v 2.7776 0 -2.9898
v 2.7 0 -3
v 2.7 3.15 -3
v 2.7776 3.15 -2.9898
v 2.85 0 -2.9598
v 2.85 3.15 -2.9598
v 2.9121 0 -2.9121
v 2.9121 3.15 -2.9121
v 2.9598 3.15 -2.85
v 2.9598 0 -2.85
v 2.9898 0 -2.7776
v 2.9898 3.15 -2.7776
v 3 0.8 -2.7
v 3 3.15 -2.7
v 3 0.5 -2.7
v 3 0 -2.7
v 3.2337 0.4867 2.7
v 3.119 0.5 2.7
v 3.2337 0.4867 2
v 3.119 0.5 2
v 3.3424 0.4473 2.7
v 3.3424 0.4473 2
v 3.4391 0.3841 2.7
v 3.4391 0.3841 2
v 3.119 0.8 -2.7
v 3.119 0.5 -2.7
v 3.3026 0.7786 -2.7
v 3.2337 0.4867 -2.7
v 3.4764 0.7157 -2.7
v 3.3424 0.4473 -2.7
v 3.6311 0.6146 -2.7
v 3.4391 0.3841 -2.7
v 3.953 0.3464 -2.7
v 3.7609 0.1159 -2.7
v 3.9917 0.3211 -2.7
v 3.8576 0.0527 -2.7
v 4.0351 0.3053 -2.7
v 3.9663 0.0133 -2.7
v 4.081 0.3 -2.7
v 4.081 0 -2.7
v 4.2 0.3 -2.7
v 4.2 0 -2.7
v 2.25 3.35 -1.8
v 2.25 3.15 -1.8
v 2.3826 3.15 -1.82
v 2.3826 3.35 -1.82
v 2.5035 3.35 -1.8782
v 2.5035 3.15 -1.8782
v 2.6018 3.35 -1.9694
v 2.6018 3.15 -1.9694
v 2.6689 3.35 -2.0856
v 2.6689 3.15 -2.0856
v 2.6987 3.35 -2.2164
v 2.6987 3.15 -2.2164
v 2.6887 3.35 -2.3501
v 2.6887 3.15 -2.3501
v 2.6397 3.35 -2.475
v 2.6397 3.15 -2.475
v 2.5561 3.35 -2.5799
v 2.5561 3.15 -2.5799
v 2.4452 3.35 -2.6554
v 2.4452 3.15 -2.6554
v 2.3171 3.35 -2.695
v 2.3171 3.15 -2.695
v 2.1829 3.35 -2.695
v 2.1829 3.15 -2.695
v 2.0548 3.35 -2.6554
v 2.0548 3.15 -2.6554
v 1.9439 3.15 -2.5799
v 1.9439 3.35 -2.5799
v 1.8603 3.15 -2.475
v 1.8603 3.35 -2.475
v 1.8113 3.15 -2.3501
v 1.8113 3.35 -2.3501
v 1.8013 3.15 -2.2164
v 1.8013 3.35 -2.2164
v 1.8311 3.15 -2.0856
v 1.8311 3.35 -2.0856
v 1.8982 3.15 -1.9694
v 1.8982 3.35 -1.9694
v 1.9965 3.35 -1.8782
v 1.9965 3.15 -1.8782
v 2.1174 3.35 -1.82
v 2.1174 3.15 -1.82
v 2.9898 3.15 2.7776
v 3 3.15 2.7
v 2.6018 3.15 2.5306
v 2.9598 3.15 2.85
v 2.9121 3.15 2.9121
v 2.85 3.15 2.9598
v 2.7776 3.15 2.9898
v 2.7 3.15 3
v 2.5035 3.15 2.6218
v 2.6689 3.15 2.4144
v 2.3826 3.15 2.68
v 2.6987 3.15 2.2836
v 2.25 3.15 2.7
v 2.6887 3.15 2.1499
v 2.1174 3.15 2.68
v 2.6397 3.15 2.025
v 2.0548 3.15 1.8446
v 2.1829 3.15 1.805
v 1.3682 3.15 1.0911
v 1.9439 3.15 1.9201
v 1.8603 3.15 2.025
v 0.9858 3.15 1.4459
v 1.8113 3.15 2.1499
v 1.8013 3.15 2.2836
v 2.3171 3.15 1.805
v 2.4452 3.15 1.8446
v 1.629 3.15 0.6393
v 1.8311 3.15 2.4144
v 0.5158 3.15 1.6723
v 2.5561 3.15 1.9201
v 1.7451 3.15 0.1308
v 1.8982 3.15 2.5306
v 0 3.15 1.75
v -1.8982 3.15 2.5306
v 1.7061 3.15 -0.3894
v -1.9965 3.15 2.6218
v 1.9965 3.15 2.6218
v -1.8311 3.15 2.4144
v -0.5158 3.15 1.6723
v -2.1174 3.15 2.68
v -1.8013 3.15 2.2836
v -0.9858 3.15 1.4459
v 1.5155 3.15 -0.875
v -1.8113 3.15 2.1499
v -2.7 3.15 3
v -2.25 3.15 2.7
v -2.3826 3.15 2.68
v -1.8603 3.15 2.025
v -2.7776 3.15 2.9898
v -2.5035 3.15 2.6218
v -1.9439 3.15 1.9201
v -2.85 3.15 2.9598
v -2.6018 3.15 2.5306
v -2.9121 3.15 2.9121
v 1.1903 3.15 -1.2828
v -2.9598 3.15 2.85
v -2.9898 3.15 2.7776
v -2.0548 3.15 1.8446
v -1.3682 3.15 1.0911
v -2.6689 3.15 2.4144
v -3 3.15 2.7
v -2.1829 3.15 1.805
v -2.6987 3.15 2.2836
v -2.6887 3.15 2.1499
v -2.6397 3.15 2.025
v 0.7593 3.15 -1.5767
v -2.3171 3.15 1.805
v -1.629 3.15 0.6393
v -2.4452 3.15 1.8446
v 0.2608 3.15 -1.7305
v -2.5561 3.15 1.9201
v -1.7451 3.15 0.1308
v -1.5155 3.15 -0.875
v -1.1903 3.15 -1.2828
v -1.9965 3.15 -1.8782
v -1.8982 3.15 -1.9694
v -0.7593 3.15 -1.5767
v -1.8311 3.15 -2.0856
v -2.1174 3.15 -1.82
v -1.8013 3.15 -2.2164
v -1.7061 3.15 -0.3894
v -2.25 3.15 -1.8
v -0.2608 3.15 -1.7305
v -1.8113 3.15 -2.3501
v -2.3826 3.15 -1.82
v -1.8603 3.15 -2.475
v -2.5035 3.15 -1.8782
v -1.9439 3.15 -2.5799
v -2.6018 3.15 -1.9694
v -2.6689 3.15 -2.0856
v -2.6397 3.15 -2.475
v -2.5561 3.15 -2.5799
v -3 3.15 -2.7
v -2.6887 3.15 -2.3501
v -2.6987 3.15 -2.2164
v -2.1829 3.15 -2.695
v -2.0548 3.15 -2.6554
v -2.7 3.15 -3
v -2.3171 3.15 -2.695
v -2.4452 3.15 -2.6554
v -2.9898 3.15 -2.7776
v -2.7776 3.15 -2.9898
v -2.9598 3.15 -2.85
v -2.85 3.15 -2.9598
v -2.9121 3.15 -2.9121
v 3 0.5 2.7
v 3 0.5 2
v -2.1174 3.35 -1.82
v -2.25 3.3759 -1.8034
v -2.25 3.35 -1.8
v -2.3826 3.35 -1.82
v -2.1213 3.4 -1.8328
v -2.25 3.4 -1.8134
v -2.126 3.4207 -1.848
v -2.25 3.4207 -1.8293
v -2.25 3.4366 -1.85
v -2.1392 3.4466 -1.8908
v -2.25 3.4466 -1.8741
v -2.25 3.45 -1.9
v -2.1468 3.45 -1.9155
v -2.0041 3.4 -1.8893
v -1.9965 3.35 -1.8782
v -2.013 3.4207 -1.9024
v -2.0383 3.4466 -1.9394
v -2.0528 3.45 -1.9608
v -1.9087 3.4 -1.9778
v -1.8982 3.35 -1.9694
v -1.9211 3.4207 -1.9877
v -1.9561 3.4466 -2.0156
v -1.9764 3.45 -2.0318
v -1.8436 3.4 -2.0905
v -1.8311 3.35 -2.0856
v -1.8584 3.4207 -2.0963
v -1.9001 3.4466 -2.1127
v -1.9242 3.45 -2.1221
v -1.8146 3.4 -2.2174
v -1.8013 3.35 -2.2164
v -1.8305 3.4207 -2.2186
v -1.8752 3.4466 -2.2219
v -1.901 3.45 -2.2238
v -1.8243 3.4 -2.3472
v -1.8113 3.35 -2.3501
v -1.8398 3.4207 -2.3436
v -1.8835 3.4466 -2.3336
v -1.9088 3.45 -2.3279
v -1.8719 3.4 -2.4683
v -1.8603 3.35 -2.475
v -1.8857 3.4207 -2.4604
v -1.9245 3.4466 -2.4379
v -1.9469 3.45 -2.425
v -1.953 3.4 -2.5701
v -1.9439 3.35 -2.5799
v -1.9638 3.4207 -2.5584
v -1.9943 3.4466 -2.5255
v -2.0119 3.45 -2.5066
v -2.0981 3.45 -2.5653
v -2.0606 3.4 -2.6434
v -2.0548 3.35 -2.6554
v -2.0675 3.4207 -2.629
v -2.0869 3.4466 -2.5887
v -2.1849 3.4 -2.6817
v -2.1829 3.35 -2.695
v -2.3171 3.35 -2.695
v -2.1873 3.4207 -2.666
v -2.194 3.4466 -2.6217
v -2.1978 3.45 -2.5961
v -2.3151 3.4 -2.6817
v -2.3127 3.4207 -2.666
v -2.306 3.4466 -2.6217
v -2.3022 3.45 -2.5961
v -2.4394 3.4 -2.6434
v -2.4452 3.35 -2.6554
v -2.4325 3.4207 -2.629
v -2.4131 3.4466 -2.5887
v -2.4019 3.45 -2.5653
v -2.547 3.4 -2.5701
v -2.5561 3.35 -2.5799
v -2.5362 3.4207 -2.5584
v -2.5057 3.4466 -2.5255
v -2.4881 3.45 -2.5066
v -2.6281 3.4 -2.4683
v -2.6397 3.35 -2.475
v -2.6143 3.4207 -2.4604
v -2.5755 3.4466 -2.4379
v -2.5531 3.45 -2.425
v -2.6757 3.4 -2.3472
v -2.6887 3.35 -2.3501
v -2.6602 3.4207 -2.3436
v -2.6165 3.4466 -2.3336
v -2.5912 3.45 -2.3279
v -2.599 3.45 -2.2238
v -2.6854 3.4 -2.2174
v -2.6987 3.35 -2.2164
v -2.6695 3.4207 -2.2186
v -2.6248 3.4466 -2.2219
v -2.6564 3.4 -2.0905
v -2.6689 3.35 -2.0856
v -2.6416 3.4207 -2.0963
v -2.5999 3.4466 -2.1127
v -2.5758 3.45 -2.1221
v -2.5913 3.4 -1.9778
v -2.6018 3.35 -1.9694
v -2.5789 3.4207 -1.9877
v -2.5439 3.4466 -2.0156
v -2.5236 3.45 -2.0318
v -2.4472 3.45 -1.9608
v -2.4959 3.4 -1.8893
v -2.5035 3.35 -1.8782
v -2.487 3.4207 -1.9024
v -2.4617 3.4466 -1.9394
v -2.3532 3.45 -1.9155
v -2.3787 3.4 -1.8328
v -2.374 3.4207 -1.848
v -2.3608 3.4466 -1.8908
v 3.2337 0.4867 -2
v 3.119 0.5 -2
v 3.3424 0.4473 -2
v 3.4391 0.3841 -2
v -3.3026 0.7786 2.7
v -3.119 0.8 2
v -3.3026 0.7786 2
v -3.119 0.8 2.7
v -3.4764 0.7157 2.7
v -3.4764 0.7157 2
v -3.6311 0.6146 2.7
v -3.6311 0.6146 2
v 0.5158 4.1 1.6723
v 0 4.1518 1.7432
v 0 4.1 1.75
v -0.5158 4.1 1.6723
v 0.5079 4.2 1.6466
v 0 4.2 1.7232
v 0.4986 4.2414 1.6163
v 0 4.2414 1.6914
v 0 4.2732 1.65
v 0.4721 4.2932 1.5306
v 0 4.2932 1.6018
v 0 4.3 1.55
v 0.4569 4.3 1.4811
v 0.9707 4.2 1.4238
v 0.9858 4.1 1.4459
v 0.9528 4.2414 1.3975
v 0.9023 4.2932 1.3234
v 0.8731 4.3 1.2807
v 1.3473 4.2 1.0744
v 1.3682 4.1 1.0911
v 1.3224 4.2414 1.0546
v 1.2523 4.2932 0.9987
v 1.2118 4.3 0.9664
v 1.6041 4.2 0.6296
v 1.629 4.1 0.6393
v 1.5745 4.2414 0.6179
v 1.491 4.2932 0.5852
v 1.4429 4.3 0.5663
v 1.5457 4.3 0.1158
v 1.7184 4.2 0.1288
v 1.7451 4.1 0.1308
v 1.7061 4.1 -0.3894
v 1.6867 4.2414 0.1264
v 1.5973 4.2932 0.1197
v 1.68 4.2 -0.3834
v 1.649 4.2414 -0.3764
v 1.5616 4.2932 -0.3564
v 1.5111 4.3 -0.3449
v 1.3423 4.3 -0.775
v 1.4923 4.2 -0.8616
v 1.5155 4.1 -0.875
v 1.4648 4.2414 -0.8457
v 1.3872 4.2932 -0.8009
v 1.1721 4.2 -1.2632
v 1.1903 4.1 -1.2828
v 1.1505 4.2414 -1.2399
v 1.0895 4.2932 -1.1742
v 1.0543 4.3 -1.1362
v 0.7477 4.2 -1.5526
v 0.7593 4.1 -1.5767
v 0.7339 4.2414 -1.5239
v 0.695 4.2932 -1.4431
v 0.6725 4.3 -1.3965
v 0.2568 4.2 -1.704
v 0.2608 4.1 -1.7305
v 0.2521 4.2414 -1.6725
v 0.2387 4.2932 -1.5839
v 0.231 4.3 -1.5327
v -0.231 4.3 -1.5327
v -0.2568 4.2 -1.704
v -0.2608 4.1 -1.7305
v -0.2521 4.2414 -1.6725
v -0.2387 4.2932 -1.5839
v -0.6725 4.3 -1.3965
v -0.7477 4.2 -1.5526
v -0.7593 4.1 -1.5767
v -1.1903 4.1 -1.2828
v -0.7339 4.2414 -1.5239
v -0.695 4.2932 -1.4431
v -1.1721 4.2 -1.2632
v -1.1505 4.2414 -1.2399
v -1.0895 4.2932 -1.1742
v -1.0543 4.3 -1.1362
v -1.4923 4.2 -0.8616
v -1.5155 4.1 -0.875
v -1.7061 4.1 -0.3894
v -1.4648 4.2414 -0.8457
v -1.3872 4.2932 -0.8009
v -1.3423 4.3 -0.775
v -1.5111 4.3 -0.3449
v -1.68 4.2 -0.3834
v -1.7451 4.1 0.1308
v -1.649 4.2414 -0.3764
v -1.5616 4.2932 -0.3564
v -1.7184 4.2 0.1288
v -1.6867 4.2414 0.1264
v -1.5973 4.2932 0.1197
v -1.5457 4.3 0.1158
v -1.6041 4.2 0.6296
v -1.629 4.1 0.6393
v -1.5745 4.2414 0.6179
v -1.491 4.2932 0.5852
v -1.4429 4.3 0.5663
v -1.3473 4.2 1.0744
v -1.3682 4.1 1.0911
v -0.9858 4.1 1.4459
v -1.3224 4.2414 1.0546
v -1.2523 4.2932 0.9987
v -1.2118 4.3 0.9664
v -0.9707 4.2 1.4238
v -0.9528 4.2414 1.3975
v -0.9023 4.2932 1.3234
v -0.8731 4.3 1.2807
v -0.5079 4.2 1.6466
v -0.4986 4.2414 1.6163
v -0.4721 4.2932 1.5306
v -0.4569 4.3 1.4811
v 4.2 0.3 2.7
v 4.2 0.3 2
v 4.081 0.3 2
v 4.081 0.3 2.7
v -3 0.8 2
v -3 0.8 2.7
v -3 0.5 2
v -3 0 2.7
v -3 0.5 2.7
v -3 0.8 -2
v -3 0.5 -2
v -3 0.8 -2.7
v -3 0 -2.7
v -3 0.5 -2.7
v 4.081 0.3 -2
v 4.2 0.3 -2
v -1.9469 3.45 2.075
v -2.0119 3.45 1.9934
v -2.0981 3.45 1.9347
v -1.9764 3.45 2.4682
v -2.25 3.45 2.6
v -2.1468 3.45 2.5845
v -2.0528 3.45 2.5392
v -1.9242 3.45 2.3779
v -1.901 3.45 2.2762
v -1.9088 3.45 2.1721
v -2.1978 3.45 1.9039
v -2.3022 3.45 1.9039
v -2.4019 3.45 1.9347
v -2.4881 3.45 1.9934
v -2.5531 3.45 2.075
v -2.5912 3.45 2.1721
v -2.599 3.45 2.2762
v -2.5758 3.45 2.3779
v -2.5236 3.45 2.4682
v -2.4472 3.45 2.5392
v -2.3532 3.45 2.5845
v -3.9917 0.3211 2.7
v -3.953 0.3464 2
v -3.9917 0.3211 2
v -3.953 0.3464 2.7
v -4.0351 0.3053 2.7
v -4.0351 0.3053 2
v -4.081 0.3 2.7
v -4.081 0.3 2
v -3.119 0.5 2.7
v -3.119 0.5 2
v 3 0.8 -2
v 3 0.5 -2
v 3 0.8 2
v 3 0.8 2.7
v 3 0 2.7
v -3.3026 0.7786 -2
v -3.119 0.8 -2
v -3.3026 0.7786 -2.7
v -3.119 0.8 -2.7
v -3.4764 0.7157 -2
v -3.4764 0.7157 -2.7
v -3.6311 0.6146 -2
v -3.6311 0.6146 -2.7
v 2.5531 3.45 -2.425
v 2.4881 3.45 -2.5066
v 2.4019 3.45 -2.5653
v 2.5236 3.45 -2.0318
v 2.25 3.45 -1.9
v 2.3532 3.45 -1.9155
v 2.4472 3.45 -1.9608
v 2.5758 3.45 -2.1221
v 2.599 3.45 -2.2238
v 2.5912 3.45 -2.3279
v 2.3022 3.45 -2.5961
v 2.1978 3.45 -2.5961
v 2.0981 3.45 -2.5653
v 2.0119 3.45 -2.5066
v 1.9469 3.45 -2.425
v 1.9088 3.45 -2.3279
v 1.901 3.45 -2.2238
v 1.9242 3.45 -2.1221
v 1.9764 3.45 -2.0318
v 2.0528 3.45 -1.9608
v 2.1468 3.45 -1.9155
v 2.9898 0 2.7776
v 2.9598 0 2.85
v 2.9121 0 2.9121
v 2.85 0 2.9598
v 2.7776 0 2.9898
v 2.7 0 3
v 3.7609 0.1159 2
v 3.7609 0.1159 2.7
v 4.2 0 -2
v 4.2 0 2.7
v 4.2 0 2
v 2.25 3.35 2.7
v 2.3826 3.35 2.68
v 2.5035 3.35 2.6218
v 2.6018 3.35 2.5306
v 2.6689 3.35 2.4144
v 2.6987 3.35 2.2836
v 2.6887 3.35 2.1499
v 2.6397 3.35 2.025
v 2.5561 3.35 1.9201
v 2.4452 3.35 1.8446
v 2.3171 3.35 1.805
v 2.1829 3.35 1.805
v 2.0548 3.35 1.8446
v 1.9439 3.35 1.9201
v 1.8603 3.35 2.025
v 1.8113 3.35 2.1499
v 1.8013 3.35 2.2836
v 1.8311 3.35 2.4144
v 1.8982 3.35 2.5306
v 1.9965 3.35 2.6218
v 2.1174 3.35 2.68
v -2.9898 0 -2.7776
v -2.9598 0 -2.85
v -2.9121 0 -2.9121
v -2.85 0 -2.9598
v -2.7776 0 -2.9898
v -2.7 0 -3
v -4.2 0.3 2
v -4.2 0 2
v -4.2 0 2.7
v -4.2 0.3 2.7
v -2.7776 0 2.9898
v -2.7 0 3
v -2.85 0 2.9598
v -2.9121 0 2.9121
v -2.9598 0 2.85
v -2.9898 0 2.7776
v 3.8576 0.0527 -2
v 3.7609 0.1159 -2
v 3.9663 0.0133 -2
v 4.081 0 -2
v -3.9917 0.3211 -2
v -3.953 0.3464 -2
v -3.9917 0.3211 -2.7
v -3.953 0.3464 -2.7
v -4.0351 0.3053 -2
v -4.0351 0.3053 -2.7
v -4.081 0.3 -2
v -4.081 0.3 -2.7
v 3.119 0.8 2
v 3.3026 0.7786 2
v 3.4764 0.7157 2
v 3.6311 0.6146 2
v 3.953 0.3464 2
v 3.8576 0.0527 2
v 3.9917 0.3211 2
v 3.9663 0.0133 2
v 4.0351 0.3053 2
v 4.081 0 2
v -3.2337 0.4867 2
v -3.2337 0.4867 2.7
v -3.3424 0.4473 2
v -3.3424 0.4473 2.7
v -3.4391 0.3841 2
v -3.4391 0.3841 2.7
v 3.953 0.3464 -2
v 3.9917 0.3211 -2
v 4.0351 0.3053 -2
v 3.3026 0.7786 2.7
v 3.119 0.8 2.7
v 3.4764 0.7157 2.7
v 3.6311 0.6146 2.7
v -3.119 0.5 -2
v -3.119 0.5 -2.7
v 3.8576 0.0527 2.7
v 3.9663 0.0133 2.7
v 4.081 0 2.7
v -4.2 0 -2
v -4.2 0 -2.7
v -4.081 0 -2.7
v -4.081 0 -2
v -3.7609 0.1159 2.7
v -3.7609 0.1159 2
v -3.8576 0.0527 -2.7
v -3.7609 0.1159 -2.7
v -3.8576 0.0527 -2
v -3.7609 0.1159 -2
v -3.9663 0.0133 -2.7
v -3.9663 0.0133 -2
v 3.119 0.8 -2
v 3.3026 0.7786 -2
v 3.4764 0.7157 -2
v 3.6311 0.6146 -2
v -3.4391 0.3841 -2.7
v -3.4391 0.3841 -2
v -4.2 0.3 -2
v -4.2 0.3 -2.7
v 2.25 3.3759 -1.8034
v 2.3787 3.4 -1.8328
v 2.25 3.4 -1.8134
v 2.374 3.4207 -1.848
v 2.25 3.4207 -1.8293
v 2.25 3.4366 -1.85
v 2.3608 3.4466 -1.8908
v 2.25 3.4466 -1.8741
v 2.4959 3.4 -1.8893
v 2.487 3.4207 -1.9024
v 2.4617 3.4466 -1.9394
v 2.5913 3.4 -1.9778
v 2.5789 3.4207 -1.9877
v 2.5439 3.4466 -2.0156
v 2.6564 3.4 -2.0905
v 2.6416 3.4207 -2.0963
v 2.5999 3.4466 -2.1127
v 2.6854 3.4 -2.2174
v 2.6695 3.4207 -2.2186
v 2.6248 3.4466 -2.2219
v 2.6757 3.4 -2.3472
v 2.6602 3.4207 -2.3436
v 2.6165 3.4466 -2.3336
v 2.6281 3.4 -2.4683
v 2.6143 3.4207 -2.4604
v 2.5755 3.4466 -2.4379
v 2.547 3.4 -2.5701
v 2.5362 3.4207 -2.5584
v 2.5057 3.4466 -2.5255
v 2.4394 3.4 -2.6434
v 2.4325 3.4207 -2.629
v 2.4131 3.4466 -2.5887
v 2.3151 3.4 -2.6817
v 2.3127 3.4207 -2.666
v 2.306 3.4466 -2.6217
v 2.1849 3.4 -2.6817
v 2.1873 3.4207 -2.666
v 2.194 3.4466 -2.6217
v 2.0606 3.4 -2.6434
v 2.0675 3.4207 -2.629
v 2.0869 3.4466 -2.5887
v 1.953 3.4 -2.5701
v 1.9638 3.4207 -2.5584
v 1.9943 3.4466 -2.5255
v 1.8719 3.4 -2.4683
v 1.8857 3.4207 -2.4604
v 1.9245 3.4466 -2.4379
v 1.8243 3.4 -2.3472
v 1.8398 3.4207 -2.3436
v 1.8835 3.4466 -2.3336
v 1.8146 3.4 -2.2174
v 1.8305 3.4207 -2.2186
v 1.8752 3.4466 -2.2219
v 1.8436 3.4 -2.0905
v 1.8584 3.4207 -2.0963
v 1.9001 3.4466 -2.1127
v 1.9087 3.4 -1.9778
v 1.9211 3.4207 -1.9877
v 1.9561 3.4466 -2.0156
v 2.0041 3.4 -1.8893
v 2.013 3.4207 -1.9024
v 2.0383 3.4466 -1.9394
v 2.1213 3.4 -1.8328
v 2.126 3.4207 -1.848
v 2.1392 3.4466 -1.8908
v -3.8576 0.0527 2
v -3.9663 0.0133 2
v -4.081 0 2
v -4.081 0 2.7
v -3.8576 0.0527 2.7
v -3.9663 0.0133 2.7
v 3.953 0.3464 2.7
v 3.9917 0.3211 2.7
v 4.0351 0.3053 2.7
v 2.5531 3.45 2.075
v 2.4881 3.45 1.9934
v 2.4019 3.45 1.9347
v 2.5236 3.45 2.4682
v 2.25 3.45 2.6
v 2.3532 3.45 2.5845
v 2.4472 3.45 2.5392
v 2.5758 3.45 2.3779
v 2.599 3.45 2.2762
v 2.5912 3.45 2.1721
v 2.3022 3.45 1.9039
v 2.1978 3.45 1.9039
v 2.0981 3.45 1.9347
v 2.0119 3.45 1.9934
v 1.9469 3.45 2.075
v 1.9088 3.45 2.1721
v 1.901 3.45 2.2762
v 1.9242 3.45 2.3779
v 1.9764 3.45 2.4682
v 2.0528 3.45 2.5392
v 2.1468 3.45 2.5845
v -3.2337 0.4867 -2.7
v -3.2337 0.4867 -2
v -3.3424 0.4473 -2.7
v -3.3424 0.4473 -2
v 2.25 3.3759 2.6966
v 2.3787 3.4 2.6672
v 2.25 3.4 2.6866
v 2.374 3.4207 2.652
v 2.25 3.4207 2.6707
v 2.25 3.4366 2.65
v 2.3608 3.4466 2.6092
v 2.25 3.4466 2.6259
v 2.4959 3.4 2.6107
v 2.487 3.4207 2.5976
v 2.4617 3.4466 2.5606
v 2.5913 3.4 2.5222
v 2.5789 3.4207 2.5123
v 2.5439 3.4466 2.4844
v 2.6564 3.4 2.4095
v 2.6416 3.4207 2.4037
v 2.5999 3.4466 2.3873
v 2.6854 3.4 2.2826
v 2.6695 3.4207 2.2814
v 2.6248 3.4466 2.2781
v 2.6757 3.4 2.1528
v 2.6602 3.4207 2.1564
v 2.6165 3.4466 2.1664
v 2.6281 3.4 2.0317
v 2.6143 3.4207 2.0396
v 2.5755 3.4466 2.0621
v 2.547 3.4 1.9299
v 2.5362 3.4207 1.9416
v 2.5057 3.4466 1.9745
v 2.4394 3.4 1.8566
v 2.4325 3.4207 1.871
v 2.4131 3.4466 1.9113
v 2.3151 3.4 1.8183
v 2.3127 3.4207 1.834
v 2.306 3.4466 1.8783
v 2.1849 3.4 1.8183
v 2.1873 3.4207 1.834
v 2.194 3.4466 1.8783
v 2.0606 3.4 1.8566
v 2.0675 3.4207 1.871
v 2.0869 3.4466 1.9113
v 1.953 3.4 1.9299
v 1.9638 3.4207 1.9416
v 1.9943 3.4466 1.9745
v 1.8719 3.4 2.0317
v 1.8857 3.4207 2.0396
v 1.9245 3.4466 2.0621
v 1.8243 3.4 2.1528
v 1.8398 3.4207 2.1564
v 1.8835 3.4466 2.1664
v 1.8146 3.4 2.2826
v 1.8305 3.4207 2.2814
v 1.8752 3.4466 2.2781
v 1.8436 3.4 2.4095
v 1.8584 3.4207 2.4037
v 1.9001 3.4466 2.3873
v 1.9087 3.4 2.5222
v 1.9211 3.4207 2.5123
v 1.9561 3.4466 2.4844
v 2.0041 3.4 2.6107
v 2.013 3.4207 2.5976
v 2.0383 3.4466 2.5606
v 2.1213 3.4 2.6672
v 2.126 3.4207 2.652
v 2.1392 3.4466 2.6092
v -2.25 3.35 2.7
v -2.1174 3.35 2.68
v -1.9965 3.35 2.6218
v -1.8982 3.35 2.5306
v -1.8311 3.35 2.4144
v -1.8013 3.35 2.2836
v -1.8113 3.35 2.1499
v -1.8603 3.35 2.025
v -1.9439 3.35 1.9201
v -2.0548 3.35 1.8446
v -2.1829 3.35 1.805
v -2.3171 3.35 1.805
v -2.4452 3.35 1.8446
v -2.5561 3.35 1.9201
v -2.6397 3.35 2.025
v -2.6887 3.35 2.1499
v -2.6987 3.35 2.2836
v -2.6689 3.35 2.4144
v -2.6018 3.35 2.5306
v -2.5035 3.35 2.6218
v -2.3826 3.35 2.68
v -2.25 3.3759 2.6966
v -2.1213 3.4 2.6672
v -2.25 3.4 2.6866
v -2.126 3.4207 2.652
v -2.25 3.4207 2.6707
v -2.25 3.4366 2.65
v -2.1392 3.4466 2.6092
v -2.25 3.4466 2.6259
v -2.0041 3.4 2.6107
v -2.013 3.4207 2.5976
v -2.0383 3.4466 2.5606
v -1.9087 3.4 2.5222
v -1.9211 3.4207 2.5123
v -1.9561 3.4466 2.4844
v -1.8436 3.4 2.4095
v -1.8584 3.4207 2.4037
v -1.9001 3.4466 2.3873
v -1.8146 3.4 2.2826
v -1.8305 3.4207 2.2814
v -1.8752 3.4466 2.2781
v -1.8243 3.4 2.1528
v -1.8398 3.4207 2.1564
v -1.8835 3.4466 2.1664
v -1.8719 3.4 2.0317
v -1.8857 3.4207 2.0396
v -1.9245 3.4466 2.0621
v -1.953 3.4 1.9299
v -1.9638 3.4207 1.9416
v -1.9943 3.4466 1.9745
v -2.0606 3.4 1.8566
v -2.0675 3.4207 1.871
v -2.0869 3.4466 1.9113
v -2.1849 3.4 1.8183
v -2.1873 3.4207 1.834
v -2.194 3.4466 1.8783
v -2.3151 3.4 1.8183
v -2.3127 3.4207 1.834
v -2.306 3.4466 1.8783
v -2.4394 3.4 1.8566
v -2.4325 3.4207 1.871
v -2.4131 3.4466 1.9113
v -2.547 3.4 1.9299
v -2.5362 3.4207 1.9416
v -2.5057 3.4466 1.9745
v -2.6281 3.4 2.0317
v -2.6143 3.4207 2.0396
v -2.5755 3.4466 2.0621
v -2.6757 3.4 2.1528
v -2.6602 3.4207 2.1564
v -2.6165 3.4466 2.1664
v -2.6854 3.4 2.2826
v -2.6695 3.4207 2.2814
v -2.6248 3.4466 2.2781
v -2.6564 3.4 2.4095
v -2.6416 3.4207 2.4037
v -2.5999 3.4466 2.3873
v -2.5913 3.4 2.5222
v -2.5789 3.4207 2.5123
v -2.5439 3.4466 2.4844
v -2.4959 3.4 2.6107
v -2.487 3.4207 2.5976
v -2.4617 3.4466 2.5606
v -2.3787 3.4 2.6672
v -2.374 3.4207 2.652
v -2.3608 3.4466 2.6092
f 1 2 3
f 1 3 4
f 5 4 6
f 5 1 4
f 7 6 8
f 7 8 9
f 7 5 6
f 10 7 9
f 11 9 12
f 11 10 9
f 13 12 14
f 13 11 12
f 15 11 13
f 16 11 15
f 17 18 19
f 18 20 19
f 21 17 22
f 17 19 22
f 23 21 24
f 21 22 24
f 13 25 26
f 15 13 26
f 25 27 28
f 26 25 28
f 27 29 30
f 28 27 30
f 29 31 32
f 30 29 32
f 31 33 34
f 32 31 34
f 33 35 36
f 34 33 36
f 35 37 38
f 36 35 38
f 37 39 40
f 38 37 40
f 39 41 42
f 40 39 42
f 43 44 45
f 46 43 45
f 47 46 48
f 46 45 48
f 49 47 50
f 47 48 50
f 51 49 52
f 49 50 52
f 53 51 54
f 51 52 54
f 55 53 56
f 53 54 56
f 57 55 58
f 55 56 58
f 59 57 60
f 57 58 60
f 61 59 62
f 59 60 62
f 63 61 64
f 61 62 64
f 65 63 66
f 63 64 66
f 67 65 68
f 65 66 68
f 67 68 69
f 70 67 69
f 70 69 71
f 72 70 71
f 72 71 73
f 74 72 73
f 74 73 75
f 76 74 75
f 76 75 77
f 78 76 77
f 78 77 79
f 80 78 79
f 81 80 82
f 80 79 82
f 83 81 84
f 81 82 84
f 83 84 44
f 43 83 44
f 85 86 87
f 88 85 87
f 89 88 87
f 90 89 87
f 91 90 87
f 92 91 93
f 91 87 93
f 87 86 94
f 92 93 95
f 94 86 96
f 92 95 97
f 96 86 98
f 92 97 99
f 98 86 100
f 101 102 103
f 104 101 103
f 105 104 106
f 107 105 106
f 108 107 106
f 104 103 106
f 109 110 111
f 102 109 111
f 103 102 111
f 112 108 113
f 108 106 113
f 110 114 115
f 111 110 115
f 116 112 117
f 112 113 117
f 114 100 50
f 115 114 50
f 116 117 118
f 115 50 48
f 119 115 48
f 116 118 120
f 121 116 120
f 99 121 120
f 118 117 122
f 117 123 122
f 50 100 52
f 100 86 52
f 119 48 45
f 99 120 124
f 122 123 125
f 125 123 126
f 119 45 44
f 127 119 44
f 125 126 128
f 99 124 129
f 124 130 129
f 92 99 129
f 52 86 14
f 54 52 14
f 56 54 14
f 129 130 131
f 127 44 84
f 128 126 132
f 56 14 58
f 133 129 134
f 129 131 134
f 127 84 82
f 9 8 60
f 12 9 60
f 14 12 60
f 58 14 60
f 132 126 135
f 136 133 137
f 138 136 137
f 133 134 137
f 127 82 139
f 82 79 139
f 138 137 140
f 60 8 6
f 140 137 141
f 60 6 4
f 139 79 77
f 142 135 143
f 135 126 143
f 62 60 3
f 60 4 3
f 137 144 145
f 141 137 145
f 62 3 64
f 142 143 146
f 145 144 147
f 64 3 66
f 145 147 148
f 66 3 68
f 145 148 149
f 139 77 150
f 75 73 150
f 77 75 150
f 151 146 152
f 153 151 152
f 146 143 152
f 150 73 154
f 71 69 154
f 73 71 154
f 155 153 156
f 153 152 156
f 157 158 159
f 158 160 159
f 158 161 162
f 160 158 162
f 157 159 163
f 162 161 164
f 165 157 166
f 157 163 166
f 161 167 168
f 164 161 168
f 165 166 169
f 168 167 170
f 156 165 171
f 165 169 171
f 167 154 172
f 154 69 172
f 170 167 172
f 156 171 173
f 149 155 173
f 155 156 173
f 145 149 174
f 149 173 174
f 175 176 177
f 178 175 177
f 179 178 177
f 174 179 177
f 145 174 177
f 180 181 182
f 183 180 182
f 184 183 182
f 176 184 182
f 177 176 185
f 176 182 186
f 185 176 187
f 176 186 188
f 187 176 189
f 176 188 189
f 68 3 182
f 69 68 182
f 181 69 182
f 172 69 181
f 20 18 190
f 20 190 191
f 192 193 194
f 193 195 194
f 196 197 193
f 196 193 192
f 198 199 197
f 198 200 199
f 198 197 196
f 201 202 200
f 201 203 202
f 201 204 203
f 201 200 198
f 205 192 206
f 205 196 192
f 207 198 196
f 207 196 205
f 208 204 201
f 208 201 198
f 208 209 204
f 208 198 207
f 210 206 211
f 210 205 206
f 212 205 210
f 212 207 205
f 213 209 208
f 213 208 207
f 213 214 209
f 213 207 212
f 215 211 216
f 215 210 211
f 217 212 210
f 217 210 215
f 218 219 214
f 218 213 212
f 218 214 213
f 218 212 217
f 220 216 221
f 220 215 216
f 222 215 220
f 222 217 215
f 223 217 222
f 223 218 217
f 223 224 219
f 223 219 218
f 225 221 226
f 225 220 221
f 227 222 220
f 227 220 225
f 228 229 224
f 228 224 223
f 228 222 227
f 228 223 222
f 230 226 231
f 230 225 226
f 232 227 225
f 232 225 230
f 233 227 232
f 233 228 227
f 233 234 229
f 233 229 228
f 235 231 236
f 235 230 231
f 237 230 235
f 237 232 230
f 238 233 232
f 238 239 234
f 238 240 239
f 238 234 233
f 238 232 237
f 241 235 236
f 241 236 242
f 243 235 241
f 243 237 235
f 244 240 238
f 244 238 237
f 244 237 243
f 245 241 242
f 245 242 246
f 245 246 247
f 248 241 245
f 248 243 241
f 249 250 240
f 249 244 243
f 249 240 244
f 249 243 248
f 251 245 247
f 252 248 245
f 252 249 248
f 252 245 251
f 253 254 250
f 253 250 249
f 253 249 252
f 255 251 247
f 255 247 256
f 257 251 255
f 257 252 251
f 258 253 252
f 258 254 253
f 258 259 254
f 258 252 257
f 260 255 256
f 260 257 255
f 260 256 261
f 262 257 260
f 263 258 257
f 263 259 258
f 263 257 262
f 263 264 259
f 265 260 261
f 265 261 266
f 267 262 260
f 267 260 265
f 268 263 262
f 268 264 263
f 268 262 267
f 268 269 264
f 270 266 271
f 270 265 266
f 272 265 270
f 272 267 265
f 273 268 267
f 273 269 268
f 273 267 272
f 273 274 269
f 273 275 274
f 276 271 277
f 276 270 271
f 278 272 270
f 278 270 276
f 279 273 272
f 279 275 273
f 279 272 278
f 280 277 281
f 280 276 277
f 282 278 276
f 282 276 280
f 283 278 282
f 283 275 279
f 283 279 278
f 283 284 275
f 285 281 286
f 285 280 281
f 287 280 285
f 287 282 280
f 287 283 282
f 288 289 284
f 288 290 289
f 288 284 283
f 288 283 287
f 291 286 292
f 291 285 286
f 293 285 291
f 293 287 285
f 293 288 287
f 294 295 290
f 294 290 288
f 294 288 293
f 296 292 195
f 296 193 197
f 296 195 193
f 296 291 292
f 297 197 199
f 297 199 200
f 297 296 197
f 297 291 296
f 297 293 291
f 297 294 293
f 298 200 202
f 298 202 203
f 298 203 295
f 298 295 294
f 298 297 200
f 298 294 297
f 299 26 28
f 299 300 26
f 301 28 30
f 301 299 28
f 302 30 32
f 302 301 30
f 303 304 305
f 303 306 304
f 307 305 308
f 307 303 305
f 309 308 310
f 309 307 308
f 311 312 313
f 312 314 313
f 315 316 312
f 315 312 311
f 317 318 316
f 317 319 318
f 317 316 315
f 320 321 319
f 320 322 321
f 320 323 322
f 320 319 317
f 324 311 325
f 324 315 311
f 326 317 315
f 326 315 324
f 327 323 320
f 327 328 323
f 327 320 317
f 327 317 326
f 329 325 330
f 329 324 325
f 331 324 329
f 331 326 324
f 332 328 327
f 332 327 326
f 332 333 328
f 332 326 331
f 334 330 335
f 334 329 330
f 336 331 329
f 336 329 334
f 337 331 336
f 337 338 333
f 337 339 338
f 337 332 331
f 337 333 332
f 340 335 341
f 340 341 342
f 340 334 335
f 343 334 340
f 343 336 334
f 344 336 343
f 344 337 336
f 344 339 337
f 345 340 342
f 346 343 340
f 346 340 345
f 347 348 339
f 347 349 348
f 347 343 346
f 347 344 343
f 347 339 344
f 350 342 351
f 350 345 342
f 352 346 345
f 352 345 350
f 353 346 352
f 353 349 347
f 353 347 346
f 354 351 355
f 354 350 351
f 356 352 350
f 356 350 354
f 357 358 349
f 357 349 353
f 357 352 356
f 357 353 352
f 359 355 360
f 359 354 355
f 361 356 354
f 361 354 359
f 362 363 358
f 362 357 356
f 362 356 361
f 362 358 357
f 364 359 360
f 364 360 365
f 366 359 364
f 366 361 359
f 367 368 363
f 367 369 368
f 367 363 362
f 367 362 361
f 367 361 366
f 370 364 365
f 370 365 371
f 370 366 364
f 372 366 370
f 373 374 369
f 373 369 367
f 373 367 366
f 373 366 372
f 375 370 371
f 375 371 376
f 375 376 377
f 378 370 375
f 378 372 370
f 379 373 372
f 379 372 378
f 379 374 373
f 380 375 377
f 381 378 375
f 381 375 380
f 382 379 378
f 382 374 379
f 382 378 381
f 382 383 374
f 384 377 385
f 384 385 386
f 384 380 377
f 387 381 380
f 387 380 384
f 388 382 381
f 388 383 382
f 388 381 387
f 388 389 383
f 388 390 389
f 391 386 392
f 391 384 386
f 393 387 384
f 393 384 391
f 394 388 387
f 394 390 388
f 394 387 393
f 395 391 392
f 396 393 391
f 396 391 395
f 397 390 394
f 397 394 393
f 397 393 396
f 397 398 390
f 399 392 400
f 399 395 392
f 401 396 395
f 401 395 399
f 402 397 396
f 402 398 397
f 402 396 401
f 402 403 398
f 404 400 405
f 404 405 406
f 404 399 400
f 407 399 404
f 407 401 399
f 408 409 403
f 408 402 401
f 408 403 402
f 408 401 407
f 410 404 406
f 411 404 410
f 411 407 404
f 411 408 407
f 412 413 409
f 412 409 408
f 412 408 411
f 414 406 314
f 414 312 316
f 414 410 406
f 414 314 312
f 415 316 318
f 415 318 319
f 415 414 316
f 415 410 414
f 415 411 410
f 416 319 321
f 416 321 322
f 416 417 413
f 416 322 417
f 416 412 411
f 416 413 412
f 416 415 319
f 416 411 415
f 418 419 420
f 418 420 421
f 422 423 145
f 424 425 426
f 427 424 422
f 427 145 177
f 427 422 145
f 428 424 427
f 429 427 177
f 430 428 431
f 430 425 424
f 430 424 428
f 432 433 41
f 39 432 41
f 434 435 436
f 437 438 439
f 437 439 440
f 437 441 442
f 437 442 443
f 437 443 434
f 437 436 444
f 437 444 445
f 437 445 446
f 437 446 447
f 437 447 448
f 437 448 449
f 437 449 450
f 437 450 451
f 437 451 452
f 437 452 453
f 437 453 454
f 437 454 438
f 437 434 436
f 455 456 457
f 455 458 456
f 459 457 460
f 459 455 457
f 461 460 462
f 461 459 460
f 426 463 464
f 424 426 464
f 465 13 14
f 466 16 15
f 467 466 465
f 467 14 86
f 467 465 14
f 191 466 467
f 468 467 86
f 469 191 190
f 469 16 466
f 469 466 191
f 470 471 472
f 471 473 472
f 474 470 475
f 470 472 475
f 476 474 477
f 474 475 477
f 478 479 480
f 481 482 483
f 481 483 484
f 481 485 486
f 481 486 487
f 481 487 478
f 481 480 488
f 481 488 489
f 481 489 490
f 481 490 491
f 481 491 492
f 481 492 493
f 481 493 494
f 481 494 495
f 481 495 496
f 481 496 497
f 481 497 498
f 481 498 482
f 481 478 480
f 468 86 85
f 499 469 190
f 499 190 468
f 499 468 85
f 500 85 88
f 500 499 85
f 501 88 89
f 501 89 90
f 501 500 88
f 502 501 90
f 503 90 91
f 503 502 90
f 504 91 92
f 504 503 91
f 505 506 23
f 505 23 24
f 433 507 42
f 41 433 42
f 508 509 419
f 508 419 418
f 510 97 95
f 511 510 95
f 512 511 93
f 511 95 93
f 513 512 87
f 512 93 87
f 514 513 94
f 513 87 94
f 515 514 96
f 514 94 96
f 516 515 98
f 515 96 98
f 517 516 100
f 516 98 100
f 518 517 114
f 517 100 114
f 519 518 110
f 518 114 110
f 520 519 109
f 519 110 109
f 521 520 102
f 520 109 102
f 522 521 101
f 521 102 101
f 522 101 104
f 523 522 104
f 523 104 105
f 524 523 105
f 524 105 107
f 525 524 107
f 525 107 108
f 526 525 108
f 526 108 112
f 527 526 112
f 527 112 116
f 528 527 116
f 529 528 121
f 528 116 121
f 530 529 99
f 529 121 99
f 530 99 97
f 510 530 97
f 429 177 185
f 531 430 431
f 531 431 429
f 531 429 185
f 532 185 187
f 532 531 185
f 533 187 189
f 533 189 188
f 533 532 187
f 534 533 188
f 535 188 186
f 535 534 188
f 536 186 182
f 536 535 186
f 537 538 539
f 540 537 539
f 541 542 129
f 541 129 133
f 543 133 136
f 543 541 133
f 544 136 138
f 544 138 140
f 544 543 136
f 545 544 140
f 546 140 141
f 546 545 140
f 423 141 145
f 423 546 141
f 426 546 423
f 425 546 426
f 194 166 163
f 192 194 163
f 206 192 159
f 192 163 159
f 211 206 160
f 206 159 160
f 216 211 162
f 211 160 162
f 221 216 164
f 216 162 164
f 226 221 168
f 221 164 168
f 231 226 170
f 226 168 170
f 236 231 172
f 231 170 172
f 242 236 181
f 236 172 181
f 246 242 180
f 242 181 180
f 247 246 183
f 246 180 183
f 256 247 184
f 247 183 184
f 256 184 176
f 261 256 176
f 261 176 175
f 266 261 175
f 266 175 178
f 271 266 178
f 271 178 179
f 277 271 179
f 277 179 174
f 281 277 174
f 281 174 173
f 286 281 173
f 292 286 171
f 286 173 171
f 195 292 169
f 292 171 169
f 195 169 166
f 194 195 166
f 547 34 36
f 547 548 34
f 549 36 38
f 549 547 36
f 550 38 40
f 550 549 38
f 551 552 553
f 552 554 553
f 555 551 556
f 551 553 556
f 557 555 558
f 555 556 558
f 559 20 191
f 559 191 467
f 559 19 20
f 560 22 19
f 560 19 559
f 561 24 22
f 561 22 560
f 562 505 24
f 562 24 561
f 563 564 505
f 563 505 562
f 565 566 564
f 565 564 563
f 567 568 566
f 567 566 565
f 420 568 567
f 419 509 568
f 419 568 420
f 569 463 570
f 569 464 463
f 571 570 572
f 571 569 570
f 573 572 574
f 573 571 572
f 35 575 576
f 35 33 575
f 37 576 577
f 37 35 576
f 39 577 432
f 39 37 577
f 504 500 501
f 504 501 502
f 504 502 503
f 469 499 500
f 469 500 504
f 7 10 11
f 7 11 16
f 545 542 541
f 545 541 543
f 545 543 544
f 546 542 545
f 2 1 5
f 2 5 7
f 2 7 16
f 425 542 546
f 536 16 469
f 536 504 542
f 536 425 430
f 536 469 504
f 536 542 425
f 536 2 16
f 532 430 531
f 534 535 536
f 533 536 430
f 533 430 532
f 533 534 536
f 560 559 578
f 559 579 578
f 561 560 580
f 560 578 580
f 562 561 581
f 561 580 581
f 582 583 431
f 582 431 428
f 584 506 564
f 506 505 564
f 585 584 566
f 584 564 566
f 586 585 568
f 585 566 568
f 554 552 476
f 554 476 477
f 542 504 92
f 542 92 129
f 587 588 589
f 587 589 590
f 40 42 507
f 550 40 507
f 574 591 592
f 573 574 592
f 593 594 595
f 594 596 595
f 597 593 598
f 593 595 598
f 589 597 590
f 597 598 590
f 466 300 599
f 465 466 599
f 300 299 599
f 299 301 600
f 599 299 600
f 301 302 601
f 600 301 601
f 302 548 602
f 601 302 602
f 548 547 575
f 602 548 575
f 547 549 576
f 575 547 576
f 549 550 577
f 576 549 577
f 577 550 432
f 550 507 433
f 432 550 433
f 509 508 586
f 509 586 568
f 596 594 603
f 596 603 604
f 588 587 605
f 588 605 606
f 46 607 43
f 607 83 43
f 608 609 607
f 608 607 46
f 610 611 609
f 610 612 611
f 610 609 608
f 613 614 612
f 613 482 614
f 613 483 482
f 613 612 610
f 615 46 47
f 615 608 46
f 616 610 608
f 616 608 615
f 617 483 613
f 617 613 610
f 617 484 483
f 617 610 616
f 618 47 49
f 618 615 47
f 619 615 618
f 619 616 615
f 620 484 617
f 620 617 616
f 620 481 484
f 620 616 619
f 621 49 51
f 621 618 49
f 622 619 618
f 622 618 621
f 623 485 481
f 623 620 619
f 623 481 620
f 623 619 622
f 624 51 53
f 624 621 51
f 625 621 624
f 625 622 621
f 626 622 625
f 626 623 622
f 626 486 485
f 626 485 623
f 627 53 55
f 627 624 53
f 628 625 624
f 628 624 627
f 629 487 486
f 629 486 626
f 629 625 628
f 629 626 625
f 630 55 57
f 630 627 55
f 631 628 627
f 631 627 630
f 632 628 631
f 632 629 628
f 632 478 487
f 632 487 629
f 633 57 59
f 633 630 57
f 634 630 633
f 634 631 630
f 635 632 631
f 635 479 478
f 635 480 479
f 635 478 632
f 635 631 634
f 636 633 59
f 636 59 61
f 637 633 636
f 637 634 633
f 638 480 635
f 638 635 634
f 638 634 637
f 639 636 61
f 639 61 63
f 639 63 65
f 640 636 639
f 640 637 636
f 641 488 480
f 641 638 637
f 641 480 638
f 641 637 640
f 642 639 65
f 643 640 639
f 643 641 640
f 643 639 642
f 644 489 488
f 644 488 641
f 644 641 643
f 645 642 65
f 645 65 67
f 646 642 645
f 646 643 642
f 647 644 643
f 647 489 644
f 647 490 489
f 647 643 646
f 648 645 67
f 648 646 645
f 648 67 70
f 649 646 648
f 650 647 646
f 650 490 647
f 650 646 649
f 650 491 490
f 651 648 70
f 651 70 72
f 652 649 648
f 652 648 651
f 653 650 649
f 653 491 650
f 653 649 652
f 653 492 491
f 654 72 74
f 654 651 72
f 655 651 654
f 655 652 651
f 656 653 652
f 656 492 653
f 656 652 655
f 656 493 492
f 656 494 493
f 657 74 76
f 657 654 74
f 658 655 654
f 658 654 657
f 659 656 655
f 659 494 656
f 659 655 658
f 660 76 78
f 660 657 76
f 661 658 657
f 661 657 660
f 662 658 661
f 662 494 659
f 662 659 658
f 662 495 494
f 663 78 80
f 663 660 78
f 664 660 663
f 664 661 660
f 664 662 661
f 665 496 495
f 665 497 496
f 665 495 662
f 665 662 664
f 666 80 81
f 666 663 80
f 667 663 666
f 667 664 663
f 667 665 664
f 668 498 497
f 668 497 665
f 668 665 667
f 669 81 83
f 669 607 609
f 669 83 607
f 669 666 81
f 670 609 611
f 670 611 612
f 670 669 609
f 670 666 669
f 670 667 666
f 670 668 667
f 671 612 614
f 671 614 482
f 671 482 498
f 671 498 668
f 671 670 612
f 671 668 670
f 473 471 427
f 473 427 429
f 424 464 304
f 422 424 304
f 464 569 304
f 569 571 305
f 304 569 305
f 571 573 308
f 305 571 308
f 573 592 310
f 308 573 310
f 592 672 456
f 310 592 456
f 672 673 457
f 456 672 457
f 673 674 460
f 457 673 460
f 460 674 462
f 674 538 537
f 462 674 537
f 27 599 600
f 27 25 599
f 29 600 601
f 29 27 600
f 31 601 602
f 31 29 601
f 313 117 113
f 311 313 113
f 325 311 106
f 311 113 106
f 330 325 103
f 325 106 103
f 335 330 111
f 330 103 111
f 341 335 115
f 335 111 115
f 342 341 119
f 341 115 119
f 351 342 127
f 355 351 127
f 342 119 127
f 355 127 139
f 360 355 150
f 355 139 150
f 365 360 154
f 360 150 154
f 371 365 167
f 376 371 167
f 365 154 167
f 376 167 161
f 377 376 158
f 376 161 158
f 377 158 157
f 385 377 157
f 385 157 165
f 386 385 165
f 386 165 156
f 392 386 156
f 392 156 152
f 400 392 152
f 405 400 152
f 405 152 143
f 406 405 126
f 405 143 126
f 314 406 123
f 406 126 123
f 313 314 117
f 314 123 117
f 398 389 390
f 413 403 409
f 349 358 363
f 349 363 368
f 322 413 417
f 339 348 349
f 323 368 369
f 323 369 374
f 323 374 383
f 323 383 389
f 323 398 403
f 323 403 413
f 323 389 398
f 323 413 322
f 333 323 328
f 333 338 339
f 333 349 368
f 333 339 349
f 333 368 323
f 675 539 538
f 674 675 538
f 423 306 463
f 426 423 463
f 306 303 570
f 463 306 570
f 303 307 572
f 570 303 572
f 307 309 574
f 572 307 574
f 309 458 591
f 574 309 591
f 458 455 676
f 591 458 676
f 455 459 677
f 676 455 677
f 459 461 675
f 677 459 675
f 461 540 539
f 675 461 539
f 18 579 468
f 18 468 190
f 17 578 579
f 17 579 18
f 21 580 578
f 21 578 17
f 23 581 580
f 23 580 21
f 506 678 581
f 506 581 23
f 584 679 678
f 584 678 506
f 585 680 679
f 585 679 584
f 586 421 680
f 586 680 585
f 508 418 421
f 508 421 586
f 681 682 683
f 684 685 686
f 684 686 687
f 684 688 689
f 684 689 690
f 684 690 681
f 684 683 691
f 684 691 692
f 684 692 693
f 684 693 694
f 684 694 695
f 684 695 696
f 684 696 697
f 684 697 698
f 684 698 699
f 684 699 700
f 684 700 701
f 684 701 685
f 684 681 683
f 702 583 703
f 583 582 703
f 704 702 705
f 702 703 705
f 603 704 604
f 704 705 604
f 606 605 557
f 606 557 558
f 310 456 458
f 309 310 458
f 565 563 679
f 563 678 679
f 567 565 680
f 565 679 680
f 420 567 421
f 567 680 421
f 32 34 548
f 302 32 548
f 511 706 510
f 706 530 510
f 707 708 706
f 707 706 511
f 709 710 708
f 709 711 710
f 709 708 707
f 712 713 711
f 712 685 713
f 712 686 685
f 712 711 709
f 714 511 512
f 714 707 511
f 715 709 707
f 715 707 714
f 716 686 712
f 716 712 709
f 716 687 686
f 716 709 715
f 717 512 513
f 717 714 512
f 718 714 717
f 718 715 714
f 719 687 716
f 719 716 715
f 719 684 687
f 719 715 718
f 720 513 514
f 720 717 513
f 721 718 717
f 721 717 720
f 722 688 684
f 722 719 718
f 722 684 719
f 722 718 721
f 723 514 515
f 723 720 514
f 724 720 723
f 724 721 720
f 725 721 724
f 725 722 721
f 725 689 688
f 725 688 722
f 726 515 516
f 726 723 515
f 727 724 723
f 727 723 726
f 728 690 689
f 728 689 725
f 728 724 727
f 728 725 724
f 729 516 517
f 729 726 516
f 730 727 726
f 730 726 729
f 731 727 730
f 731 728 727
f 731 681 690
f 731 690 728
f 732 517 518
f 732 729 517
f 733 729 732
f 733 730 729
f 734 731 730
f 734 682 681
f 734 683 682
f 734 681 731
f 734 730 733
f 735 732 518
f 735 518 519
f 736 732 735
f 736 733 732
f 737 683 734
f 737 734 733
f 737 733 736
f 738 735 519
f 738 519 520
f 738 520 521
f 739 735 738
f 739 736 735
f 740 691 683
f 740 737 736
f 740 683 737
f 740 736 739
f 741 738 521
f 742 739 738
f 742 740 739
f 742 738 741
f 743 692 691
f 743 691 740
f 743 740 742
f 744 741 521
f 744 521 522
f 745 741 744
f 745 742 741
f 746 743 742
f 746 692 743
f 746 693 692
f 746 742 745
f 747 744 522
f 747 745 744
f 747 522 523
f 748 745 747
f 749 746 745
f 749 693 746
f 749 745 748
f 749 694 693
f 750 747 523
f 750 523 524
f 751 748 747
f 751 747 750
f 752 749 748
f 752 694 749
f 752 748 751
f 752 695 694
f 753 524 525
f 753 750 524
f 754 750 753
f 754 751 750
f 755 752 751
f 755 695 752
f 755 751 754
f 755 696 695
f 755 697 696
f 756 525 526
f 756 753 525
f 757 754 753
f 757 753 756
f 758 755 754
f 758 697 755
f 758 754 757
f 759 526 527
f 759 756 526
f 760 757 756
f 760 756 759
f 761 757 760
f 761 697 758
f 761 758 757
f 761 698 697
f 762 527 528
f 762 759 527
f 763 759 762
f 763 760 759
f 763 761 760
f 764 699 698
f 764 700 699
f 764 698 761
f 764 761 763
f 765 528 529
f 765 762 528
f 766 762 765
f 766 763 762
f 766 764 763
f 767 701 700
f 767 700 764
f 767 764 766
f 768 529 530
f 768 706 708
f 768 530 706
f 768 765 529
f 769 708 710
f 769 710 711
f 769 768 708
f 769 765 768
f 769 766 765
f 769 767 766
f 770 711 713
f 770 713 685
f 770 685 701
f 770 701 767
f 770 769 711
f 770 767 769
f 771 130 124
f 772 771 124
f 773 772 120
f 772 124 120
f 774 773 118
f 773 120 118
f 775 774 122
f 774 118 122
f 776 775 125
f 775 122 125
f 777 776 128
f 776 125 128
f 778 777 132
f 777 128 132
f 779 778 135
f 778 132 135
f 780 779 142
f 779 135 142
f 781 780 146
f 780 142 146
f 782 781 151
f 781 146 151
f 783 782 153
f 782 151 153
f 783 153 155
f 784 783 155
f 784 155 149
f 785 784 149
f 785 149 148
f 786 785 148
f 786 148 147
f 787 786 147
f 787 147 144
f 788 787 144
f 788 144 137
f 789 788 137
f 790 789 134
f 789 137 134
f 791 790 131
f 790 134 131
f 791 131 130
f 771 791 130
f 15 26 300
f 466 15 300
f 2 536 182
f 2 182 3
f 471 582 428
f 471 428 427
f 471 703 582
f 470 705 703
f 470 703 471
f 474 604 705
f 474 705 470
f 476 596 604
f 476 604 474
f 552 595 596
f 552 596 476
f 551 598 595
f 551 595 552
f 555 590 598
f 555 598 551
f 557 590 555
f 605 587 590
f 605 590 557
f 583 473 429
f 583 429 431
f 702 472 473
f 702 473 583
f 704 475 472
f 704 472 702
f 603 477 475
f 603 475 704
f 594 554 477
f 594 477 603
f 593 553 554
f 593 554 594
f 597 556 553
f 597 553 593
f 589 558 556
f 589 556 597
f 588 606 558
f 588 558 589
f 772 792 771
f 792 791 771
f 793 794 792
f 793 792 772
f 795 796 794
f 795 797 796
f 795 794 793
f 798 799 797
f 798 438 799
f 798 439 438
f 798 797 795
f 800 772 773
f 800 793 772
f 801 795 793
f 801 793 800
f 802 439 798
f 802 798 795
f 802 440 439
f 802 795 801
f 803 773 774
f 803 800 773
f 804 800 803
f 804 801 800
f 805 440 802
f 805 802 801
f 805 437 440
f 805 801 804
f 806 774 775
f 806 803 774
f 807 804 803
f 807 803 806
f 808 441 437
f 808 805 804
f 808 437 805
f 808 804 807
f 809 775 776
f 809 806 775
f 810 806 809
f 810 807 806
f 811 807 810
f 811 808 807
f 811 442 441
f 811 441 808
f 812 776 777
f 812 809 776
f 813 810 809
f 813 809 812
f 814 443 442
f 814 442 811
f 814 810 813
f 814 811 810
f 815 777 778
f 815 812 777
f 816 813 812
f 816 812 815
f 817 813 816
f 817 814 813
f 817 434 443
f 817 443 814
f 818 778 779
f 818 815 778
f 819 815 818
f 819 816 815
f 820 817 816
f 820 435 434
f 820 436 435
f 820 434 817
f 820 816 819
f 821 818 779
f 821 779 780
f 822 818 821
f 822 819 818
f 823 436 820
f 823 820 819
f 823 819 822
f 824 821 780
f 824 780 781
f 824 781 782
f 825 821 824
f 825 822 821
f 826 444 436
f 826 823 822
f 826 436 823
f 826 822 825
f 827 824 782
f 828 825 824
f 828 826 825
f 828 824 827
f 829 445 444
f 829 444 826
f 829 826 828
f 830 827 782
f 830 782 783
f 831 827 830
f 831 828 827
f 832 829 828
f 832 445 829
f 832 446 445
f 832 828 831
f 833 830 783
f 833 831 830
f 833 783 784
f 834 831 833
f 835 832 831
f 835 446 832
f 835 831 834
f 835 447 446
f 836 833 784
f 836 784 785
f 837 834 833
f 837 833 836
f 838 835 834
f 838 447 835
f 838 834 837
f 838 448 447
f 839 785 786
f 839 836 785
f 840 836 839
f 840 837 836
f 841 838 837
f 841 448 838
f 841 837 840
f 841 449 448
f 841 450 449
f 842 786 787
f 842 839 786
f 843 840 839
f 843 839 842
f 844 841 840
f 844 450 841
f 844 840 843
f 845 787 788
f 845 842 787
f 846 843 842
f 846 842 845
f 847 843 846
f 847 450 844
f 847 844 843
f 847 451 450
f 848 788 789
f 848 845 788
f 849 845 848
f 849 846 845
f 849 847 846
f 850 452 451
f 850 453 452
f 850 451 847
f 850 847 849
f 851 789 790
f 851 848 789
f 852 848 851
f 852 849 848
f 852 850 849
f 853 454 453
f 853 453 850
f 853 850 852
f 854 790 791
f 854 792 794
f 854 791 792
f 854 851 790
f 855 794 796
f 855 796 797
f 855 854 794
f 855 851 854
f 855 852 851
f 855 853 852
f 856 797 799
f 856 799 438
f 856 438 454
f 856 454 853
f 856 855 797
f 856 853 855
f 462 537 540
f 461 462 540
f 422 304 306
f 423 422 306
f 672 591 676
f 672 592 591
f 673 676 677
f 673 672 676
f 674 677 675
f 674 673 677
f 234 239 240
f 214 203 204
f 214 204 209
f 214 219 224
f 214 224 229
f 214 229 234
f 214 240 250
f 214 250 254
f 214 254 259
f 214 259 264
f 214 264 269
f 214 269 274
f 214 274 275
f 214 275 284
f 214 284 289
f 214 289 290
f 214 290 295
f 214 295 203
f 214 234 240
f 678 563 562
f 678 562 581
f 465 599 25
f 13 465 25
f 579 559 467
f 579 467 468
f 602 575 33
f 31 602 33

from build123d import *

# Parameters (mm, degrees)
BOSS_EXTRUDE1_DEPTH     = 3.15
SKETCH2_R               = 1.75
BOSS_EXTRUDE2_DEPTH     = 1.15
FILLET1_R               = 0.2
SKETCH3_R               = 0.45
BOSS_EXTRUDE3_DEPTH     = 0.3
SKETCH4_W               = 0.7
SKETCH4_H               = 0.3
MIRROR2_COPY_1_SKETCH_W = 0.7
MIRROR2_COPY_1_SKETCH_H = 0.3
FILLET2_R               = 0.1


with BuildPart() as part:
    # Sketch1 → Boss-Extrude1 (new body)
    with BuildSketch(Plane(origin=(0, 0, 0), x_dir=(1, 0, 0), z_dir=(0, 1, 0))):
        with BuildLine():
            Line((-2.7, 3), (2.7, 3))
            ThreePointArc((2.7, 3), (2.912132034, 2.912132034), (3, 2.7))
            Line((3, 2.7), (3, -2.7))
            ThreePointArc((3, -2.7), (2.912132034, -2.912132034), (2.7, -3))
            Line((2.7, -3), (-2.7, -3))
            ThreePointArc((-2.7, -3), (-2.912132034, -2.912132034), (-3, -2.7))
            Line((-3, -2.7), (-3, 2.7))
            ThreePointArc((-3, 2.7), (-2.912132034, 2.912132034), (-2.7, 3))
        make_face()
    extrude(amount=BOSS_EXTRUDE1_DEPTH)

    # Sketch2 → Boss-Extrude2 (add)
    with BuildSketch(Plane(origin=(0, 3.15, 0), x_dir=(1, 0, 0), z_dir=(0, 1, 0))):
        with Locations(Location((0, 0, 0), (0, 0, 270))):
            Circle(SKETCH2_R)
    extrude(amount=BOSS_EXTRUDE2_DEPTH)

    # Fillet1
    fillet1_edges = [part.edges().sort_by_distance(p)[0] for p in [
        (0, 4.3, -1.75),
    ]]
    fillet(fillet1_edges, radius=FILLET1_R)

    # Sketch3 → Boss-Extrude3 (add)
    with BuildSketch(Plane(origin=(0, 3.15, 0), x_dir=(1, 0, 0), z_dir=(0, 1, 0))):
        with Locations(Location((-2.25, 2.25, 0), (0, 0, 270))):
            Circle(SKETCH3_R)
        with Locations(Location((2.25, 2.25, 0), (0, 0, 270))):
            Circle(SKETCH3_R)
        with Locations(Location((2.25, -2.25, 0), (0, 0, 270))):
            Circle(SKETCH3_R)
        with Locations(Location((-2.25, -2.25, 0), (0, 0, 270))):
            Circle(SKETCH3_R)
    extrude(amount=BOSS_EXTRUDE3_DEPTH)

    # Sweep1: sweep along a path in Sketch5
    with BuildLine(Plane.XY.offset(2.7)) as sweep1_path:
        Line((3, 0.5), (3.118975032, 0.5))
        ThreePointArc((3.118975032, 0.5), (3.289187664, 0.470135789), (3.439067232, 0.38411064))
        Line((3.439067232, 0.38411064), (3.760932768, 0.11588936))
        ThreePointArc((3.760932768, 0.11588936), (3.910812336, 0.029864211), (4.081024968, 0))
        Line((4.081024968, 0), (4.2, 0))
    # Sketch4 → Sweep1 (sweep)
    with BuildSketch(Plane(origin=(3, 0, 0), x_dir=(0, 0, -1), z_dir=(1, 0, 0))):
        with Locations((-2.35, 0.65)):
            Rectangle(SKETCH4_W, SKETCH4_H)
    sweep1 = sweep(path=sweep1_path.line)

    # Mirror1: Sweep1 across plane
    add(sweep1.mirror(Plane.XY))

    # Mirror2: Sweep1 across plane
    add(sweep1.mirror(Plane(origin=(0, 0, 0), x_dir=(0, 0, 1), z_dir=(1, 0, 0))))

    # Mirror2 copy 1: sweep along a path in Mirror2 copy 1 path
    with BuildLine(Plane(origin=(0, 0, -2.7), x_dir=(-1, 0, 0), z_dir=(0, 0, -1))) as mirror2_copy_1_path:
        Line((3, 0.5), (3.118975032, 0.5))
        ThreePointArc((3.118975032, 0.5), (3.289187664, 0.470135789), (3.439067232, 0.38411064))
        Line((3.439067232, 0.38411064), (3.760932768, 0.11588936))
        ThreePointArc((3.760932768, 0.11588936), (3.910812336, 0.029864211), (4.081024968, 0))
        Line((4.081024968, 0), (4.2, 0))
    # Mirror2 copy 1 sketch → Mirror2 copy 1 (sweep)
    with BuildSketch(Plane.ZY.offset(3)):
        with Locations((-2.35, 0.65)):
            Rectangle(MIRROR2_COPY_1_SKETCH_W, MIRROR2_COPY_1_SKETCH_H)
    sweep(path=mirror2_copy_1_path.line)

    # Fillet2
    fillet2_edges = [part.edges().sort_by_distance(p)[0] for p in [
        (-2.25, 3.45, -2.7),
        (2.25, 3.45, -2.7),
        (2.25, 3.45, 1.8),
        (-2.25, 3.45, 1.8),
    ]]
    fillet(fillet2_edges, radius=FILLET2_R)


solid = part.part
